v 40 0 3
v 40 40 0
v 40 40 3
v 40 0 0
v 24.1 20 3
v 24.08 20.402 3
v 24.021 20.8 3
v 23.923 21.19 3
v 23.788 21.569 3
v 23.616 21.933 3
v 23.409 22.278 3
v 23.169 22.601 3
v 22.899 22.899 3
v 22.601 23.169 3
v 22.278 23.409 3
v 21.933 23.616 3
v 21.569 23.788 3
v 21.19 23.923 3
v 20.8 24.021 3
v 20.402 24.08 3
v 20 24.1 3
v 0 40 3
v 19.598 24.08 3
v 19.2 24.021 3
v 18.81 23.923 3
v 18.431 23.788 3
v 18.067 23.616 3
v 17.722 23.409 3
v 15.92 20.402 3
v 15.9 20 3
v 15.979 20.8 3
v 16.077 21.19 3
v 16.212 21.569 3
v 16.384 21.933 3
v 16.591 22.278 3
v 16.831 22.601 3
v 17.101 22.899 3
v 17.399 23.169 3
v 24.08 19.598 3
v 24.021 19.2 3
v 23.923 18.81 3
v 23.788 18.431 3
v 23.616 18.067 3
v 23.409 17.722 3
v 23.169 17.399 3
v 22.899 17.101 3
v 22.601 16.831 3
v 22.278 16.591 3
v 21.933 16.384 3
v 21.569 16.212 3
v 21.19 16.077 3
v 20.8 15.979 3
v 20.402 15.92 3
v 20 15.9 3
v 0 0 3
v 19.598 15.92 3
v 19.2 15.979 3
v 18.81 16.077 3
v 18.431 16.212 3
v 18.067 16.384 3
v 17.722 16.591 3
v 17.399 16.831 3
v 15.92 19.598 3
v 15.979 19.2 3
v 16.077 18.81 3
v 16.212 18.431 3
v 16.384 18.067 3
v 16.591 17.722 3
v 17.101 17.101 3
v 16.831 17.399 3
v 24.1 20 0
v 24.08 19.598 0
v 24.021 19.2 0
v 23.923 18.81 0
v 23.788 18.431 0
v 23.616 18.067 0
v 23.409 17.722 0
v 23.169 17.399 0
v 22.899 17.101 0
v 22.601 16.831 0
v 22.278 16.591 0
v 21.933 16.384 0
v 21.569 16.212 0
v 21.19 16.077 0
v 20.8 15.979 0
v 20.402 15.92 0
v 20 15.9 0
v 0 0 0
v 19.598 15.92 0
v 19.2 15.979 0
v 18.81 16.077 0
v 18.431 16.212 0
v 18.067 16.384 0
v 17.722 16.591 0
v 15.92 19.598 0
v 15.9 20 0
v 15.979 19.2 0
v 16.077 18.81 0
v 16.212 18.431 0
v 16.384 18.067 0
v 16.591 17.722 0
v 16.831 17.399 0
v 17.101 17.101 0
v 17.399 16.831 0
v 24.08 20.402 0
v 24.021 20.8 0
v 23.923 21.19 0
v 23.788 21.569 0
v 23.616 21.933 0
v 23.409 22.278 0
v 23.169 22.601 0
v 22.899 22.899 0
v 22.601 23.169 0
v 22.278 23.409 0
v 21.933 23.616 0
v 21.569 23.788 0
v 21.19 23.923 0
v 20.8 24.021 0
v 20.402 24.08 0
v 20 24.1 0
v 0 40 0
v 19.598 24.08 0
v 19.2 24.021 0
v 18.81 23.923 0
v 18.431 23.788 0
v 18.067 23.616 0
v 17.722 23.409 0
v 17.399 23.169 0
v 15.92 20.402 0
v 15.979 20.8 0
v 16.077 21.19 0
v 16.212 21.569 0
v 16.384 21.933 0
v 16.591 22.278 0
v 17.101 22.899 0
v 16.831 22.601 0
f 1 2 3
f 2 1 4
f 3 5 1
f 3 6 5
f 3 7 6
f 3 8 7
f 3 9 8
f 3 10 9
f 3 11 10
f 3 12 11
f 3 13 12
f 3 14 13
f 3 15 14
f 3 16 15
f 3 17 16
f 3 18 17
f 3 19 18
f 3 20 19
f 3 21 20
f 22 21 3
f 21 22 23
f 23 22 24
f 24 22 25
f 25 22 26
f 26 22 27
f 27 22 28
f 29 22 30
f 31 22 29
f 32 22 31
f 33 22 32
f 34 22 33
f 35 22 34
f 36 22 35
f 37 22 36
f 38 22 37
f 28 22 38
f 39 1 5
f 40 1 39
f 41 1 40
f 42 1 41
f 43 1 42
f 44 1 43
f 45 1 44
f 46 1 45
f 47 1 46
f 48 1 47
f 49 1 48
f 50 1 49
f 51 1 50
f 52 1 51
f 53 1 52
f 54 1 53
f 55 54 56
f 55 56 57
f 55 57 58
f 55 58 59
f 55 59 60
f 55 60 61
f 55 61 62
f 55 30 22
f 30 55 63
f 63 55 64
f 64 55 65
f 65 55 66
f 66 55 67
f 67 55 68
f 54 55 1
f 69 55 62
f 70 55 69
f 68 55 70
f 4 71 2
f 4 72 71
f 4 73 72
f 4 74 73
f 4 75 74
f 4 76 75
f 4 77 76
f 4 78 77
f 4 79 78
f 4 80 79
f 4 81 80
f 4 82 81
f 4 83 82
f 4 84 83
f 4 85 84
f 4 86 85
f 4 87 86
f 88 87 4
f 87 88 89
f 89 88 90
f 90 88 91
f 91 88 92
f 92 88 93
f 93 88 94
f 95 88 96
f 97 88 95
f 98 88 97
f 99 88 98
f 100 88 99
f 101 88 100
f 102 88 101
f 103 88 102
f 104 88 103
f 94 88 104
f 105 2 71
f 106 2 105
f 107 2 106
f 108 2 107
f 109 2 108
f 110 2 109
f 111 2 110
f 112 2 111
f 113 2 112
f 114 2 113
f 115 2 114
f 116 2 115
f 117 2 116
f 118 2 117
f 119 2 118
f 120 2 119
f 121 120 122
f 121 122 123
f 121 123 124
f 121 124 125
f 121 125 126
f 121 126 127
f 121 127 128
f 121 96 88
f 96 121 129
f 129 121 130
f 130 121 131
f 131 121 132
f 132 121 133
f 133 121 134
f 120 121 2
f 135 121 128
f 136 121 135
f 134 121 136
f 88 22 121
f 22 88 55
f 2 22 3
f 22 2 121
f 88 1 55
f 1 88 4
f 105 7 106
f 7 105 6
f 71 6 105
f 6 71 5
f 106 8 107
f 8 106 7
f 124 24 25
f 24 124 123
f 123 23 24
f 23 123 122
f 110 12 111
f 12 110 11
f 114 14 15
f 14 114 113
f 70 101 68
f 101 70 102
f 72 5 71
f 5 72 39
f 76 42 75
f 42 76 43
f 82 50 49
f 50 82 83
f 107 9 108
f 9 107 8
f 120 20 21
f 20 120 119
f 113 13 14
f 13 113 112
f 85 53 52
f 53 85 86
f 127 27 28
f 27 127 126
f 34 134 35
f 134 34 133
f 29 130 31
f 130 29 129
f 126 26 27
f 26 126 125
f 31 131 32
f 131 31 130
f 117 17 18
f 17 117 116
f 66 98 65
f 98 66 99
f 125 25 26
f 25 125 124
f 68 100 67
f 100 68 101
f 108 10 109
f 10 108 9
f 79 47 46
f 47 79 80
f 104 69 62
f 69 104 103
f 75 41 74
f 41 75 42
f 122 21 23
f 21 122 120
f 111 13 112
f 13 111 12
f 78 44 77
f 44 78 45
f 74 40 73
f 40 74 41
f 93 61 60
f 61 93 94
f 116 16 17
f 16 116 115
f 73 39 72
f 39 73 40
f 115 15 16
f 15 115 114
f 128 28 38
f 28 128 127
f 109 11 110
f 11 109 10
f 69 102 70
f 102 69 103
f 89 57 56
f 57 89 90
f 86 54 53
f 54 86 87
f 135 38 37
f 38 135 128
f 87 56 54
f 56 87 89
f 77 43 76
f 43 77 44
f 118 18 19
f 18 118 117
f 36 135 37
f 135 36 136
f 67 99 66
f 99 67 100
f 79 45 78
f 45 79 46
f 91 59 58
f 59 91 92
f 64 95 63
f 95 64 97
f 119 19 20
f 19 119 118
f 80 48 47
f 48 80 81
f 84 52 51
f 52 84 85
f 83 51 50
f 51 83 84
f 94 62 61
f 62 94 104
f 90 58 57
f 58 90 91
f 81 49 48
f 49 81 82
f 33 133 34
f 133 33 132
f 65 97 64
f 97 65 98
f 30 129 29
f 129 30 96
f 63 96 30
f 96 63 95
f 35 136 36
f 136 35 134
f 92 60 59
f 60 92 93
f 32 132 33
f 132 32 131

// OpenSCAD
width = 40;
depth = 40;
height = 3;
hole_diameter = 8.2;

$fn = 64;
f = 0.01;
df = 2 * f;

difference() {
    cube([width, depth, height]);
    translate([width/2, depth/2, -f])
        cylinder(d = hole_diameter, h = height + df);
}
